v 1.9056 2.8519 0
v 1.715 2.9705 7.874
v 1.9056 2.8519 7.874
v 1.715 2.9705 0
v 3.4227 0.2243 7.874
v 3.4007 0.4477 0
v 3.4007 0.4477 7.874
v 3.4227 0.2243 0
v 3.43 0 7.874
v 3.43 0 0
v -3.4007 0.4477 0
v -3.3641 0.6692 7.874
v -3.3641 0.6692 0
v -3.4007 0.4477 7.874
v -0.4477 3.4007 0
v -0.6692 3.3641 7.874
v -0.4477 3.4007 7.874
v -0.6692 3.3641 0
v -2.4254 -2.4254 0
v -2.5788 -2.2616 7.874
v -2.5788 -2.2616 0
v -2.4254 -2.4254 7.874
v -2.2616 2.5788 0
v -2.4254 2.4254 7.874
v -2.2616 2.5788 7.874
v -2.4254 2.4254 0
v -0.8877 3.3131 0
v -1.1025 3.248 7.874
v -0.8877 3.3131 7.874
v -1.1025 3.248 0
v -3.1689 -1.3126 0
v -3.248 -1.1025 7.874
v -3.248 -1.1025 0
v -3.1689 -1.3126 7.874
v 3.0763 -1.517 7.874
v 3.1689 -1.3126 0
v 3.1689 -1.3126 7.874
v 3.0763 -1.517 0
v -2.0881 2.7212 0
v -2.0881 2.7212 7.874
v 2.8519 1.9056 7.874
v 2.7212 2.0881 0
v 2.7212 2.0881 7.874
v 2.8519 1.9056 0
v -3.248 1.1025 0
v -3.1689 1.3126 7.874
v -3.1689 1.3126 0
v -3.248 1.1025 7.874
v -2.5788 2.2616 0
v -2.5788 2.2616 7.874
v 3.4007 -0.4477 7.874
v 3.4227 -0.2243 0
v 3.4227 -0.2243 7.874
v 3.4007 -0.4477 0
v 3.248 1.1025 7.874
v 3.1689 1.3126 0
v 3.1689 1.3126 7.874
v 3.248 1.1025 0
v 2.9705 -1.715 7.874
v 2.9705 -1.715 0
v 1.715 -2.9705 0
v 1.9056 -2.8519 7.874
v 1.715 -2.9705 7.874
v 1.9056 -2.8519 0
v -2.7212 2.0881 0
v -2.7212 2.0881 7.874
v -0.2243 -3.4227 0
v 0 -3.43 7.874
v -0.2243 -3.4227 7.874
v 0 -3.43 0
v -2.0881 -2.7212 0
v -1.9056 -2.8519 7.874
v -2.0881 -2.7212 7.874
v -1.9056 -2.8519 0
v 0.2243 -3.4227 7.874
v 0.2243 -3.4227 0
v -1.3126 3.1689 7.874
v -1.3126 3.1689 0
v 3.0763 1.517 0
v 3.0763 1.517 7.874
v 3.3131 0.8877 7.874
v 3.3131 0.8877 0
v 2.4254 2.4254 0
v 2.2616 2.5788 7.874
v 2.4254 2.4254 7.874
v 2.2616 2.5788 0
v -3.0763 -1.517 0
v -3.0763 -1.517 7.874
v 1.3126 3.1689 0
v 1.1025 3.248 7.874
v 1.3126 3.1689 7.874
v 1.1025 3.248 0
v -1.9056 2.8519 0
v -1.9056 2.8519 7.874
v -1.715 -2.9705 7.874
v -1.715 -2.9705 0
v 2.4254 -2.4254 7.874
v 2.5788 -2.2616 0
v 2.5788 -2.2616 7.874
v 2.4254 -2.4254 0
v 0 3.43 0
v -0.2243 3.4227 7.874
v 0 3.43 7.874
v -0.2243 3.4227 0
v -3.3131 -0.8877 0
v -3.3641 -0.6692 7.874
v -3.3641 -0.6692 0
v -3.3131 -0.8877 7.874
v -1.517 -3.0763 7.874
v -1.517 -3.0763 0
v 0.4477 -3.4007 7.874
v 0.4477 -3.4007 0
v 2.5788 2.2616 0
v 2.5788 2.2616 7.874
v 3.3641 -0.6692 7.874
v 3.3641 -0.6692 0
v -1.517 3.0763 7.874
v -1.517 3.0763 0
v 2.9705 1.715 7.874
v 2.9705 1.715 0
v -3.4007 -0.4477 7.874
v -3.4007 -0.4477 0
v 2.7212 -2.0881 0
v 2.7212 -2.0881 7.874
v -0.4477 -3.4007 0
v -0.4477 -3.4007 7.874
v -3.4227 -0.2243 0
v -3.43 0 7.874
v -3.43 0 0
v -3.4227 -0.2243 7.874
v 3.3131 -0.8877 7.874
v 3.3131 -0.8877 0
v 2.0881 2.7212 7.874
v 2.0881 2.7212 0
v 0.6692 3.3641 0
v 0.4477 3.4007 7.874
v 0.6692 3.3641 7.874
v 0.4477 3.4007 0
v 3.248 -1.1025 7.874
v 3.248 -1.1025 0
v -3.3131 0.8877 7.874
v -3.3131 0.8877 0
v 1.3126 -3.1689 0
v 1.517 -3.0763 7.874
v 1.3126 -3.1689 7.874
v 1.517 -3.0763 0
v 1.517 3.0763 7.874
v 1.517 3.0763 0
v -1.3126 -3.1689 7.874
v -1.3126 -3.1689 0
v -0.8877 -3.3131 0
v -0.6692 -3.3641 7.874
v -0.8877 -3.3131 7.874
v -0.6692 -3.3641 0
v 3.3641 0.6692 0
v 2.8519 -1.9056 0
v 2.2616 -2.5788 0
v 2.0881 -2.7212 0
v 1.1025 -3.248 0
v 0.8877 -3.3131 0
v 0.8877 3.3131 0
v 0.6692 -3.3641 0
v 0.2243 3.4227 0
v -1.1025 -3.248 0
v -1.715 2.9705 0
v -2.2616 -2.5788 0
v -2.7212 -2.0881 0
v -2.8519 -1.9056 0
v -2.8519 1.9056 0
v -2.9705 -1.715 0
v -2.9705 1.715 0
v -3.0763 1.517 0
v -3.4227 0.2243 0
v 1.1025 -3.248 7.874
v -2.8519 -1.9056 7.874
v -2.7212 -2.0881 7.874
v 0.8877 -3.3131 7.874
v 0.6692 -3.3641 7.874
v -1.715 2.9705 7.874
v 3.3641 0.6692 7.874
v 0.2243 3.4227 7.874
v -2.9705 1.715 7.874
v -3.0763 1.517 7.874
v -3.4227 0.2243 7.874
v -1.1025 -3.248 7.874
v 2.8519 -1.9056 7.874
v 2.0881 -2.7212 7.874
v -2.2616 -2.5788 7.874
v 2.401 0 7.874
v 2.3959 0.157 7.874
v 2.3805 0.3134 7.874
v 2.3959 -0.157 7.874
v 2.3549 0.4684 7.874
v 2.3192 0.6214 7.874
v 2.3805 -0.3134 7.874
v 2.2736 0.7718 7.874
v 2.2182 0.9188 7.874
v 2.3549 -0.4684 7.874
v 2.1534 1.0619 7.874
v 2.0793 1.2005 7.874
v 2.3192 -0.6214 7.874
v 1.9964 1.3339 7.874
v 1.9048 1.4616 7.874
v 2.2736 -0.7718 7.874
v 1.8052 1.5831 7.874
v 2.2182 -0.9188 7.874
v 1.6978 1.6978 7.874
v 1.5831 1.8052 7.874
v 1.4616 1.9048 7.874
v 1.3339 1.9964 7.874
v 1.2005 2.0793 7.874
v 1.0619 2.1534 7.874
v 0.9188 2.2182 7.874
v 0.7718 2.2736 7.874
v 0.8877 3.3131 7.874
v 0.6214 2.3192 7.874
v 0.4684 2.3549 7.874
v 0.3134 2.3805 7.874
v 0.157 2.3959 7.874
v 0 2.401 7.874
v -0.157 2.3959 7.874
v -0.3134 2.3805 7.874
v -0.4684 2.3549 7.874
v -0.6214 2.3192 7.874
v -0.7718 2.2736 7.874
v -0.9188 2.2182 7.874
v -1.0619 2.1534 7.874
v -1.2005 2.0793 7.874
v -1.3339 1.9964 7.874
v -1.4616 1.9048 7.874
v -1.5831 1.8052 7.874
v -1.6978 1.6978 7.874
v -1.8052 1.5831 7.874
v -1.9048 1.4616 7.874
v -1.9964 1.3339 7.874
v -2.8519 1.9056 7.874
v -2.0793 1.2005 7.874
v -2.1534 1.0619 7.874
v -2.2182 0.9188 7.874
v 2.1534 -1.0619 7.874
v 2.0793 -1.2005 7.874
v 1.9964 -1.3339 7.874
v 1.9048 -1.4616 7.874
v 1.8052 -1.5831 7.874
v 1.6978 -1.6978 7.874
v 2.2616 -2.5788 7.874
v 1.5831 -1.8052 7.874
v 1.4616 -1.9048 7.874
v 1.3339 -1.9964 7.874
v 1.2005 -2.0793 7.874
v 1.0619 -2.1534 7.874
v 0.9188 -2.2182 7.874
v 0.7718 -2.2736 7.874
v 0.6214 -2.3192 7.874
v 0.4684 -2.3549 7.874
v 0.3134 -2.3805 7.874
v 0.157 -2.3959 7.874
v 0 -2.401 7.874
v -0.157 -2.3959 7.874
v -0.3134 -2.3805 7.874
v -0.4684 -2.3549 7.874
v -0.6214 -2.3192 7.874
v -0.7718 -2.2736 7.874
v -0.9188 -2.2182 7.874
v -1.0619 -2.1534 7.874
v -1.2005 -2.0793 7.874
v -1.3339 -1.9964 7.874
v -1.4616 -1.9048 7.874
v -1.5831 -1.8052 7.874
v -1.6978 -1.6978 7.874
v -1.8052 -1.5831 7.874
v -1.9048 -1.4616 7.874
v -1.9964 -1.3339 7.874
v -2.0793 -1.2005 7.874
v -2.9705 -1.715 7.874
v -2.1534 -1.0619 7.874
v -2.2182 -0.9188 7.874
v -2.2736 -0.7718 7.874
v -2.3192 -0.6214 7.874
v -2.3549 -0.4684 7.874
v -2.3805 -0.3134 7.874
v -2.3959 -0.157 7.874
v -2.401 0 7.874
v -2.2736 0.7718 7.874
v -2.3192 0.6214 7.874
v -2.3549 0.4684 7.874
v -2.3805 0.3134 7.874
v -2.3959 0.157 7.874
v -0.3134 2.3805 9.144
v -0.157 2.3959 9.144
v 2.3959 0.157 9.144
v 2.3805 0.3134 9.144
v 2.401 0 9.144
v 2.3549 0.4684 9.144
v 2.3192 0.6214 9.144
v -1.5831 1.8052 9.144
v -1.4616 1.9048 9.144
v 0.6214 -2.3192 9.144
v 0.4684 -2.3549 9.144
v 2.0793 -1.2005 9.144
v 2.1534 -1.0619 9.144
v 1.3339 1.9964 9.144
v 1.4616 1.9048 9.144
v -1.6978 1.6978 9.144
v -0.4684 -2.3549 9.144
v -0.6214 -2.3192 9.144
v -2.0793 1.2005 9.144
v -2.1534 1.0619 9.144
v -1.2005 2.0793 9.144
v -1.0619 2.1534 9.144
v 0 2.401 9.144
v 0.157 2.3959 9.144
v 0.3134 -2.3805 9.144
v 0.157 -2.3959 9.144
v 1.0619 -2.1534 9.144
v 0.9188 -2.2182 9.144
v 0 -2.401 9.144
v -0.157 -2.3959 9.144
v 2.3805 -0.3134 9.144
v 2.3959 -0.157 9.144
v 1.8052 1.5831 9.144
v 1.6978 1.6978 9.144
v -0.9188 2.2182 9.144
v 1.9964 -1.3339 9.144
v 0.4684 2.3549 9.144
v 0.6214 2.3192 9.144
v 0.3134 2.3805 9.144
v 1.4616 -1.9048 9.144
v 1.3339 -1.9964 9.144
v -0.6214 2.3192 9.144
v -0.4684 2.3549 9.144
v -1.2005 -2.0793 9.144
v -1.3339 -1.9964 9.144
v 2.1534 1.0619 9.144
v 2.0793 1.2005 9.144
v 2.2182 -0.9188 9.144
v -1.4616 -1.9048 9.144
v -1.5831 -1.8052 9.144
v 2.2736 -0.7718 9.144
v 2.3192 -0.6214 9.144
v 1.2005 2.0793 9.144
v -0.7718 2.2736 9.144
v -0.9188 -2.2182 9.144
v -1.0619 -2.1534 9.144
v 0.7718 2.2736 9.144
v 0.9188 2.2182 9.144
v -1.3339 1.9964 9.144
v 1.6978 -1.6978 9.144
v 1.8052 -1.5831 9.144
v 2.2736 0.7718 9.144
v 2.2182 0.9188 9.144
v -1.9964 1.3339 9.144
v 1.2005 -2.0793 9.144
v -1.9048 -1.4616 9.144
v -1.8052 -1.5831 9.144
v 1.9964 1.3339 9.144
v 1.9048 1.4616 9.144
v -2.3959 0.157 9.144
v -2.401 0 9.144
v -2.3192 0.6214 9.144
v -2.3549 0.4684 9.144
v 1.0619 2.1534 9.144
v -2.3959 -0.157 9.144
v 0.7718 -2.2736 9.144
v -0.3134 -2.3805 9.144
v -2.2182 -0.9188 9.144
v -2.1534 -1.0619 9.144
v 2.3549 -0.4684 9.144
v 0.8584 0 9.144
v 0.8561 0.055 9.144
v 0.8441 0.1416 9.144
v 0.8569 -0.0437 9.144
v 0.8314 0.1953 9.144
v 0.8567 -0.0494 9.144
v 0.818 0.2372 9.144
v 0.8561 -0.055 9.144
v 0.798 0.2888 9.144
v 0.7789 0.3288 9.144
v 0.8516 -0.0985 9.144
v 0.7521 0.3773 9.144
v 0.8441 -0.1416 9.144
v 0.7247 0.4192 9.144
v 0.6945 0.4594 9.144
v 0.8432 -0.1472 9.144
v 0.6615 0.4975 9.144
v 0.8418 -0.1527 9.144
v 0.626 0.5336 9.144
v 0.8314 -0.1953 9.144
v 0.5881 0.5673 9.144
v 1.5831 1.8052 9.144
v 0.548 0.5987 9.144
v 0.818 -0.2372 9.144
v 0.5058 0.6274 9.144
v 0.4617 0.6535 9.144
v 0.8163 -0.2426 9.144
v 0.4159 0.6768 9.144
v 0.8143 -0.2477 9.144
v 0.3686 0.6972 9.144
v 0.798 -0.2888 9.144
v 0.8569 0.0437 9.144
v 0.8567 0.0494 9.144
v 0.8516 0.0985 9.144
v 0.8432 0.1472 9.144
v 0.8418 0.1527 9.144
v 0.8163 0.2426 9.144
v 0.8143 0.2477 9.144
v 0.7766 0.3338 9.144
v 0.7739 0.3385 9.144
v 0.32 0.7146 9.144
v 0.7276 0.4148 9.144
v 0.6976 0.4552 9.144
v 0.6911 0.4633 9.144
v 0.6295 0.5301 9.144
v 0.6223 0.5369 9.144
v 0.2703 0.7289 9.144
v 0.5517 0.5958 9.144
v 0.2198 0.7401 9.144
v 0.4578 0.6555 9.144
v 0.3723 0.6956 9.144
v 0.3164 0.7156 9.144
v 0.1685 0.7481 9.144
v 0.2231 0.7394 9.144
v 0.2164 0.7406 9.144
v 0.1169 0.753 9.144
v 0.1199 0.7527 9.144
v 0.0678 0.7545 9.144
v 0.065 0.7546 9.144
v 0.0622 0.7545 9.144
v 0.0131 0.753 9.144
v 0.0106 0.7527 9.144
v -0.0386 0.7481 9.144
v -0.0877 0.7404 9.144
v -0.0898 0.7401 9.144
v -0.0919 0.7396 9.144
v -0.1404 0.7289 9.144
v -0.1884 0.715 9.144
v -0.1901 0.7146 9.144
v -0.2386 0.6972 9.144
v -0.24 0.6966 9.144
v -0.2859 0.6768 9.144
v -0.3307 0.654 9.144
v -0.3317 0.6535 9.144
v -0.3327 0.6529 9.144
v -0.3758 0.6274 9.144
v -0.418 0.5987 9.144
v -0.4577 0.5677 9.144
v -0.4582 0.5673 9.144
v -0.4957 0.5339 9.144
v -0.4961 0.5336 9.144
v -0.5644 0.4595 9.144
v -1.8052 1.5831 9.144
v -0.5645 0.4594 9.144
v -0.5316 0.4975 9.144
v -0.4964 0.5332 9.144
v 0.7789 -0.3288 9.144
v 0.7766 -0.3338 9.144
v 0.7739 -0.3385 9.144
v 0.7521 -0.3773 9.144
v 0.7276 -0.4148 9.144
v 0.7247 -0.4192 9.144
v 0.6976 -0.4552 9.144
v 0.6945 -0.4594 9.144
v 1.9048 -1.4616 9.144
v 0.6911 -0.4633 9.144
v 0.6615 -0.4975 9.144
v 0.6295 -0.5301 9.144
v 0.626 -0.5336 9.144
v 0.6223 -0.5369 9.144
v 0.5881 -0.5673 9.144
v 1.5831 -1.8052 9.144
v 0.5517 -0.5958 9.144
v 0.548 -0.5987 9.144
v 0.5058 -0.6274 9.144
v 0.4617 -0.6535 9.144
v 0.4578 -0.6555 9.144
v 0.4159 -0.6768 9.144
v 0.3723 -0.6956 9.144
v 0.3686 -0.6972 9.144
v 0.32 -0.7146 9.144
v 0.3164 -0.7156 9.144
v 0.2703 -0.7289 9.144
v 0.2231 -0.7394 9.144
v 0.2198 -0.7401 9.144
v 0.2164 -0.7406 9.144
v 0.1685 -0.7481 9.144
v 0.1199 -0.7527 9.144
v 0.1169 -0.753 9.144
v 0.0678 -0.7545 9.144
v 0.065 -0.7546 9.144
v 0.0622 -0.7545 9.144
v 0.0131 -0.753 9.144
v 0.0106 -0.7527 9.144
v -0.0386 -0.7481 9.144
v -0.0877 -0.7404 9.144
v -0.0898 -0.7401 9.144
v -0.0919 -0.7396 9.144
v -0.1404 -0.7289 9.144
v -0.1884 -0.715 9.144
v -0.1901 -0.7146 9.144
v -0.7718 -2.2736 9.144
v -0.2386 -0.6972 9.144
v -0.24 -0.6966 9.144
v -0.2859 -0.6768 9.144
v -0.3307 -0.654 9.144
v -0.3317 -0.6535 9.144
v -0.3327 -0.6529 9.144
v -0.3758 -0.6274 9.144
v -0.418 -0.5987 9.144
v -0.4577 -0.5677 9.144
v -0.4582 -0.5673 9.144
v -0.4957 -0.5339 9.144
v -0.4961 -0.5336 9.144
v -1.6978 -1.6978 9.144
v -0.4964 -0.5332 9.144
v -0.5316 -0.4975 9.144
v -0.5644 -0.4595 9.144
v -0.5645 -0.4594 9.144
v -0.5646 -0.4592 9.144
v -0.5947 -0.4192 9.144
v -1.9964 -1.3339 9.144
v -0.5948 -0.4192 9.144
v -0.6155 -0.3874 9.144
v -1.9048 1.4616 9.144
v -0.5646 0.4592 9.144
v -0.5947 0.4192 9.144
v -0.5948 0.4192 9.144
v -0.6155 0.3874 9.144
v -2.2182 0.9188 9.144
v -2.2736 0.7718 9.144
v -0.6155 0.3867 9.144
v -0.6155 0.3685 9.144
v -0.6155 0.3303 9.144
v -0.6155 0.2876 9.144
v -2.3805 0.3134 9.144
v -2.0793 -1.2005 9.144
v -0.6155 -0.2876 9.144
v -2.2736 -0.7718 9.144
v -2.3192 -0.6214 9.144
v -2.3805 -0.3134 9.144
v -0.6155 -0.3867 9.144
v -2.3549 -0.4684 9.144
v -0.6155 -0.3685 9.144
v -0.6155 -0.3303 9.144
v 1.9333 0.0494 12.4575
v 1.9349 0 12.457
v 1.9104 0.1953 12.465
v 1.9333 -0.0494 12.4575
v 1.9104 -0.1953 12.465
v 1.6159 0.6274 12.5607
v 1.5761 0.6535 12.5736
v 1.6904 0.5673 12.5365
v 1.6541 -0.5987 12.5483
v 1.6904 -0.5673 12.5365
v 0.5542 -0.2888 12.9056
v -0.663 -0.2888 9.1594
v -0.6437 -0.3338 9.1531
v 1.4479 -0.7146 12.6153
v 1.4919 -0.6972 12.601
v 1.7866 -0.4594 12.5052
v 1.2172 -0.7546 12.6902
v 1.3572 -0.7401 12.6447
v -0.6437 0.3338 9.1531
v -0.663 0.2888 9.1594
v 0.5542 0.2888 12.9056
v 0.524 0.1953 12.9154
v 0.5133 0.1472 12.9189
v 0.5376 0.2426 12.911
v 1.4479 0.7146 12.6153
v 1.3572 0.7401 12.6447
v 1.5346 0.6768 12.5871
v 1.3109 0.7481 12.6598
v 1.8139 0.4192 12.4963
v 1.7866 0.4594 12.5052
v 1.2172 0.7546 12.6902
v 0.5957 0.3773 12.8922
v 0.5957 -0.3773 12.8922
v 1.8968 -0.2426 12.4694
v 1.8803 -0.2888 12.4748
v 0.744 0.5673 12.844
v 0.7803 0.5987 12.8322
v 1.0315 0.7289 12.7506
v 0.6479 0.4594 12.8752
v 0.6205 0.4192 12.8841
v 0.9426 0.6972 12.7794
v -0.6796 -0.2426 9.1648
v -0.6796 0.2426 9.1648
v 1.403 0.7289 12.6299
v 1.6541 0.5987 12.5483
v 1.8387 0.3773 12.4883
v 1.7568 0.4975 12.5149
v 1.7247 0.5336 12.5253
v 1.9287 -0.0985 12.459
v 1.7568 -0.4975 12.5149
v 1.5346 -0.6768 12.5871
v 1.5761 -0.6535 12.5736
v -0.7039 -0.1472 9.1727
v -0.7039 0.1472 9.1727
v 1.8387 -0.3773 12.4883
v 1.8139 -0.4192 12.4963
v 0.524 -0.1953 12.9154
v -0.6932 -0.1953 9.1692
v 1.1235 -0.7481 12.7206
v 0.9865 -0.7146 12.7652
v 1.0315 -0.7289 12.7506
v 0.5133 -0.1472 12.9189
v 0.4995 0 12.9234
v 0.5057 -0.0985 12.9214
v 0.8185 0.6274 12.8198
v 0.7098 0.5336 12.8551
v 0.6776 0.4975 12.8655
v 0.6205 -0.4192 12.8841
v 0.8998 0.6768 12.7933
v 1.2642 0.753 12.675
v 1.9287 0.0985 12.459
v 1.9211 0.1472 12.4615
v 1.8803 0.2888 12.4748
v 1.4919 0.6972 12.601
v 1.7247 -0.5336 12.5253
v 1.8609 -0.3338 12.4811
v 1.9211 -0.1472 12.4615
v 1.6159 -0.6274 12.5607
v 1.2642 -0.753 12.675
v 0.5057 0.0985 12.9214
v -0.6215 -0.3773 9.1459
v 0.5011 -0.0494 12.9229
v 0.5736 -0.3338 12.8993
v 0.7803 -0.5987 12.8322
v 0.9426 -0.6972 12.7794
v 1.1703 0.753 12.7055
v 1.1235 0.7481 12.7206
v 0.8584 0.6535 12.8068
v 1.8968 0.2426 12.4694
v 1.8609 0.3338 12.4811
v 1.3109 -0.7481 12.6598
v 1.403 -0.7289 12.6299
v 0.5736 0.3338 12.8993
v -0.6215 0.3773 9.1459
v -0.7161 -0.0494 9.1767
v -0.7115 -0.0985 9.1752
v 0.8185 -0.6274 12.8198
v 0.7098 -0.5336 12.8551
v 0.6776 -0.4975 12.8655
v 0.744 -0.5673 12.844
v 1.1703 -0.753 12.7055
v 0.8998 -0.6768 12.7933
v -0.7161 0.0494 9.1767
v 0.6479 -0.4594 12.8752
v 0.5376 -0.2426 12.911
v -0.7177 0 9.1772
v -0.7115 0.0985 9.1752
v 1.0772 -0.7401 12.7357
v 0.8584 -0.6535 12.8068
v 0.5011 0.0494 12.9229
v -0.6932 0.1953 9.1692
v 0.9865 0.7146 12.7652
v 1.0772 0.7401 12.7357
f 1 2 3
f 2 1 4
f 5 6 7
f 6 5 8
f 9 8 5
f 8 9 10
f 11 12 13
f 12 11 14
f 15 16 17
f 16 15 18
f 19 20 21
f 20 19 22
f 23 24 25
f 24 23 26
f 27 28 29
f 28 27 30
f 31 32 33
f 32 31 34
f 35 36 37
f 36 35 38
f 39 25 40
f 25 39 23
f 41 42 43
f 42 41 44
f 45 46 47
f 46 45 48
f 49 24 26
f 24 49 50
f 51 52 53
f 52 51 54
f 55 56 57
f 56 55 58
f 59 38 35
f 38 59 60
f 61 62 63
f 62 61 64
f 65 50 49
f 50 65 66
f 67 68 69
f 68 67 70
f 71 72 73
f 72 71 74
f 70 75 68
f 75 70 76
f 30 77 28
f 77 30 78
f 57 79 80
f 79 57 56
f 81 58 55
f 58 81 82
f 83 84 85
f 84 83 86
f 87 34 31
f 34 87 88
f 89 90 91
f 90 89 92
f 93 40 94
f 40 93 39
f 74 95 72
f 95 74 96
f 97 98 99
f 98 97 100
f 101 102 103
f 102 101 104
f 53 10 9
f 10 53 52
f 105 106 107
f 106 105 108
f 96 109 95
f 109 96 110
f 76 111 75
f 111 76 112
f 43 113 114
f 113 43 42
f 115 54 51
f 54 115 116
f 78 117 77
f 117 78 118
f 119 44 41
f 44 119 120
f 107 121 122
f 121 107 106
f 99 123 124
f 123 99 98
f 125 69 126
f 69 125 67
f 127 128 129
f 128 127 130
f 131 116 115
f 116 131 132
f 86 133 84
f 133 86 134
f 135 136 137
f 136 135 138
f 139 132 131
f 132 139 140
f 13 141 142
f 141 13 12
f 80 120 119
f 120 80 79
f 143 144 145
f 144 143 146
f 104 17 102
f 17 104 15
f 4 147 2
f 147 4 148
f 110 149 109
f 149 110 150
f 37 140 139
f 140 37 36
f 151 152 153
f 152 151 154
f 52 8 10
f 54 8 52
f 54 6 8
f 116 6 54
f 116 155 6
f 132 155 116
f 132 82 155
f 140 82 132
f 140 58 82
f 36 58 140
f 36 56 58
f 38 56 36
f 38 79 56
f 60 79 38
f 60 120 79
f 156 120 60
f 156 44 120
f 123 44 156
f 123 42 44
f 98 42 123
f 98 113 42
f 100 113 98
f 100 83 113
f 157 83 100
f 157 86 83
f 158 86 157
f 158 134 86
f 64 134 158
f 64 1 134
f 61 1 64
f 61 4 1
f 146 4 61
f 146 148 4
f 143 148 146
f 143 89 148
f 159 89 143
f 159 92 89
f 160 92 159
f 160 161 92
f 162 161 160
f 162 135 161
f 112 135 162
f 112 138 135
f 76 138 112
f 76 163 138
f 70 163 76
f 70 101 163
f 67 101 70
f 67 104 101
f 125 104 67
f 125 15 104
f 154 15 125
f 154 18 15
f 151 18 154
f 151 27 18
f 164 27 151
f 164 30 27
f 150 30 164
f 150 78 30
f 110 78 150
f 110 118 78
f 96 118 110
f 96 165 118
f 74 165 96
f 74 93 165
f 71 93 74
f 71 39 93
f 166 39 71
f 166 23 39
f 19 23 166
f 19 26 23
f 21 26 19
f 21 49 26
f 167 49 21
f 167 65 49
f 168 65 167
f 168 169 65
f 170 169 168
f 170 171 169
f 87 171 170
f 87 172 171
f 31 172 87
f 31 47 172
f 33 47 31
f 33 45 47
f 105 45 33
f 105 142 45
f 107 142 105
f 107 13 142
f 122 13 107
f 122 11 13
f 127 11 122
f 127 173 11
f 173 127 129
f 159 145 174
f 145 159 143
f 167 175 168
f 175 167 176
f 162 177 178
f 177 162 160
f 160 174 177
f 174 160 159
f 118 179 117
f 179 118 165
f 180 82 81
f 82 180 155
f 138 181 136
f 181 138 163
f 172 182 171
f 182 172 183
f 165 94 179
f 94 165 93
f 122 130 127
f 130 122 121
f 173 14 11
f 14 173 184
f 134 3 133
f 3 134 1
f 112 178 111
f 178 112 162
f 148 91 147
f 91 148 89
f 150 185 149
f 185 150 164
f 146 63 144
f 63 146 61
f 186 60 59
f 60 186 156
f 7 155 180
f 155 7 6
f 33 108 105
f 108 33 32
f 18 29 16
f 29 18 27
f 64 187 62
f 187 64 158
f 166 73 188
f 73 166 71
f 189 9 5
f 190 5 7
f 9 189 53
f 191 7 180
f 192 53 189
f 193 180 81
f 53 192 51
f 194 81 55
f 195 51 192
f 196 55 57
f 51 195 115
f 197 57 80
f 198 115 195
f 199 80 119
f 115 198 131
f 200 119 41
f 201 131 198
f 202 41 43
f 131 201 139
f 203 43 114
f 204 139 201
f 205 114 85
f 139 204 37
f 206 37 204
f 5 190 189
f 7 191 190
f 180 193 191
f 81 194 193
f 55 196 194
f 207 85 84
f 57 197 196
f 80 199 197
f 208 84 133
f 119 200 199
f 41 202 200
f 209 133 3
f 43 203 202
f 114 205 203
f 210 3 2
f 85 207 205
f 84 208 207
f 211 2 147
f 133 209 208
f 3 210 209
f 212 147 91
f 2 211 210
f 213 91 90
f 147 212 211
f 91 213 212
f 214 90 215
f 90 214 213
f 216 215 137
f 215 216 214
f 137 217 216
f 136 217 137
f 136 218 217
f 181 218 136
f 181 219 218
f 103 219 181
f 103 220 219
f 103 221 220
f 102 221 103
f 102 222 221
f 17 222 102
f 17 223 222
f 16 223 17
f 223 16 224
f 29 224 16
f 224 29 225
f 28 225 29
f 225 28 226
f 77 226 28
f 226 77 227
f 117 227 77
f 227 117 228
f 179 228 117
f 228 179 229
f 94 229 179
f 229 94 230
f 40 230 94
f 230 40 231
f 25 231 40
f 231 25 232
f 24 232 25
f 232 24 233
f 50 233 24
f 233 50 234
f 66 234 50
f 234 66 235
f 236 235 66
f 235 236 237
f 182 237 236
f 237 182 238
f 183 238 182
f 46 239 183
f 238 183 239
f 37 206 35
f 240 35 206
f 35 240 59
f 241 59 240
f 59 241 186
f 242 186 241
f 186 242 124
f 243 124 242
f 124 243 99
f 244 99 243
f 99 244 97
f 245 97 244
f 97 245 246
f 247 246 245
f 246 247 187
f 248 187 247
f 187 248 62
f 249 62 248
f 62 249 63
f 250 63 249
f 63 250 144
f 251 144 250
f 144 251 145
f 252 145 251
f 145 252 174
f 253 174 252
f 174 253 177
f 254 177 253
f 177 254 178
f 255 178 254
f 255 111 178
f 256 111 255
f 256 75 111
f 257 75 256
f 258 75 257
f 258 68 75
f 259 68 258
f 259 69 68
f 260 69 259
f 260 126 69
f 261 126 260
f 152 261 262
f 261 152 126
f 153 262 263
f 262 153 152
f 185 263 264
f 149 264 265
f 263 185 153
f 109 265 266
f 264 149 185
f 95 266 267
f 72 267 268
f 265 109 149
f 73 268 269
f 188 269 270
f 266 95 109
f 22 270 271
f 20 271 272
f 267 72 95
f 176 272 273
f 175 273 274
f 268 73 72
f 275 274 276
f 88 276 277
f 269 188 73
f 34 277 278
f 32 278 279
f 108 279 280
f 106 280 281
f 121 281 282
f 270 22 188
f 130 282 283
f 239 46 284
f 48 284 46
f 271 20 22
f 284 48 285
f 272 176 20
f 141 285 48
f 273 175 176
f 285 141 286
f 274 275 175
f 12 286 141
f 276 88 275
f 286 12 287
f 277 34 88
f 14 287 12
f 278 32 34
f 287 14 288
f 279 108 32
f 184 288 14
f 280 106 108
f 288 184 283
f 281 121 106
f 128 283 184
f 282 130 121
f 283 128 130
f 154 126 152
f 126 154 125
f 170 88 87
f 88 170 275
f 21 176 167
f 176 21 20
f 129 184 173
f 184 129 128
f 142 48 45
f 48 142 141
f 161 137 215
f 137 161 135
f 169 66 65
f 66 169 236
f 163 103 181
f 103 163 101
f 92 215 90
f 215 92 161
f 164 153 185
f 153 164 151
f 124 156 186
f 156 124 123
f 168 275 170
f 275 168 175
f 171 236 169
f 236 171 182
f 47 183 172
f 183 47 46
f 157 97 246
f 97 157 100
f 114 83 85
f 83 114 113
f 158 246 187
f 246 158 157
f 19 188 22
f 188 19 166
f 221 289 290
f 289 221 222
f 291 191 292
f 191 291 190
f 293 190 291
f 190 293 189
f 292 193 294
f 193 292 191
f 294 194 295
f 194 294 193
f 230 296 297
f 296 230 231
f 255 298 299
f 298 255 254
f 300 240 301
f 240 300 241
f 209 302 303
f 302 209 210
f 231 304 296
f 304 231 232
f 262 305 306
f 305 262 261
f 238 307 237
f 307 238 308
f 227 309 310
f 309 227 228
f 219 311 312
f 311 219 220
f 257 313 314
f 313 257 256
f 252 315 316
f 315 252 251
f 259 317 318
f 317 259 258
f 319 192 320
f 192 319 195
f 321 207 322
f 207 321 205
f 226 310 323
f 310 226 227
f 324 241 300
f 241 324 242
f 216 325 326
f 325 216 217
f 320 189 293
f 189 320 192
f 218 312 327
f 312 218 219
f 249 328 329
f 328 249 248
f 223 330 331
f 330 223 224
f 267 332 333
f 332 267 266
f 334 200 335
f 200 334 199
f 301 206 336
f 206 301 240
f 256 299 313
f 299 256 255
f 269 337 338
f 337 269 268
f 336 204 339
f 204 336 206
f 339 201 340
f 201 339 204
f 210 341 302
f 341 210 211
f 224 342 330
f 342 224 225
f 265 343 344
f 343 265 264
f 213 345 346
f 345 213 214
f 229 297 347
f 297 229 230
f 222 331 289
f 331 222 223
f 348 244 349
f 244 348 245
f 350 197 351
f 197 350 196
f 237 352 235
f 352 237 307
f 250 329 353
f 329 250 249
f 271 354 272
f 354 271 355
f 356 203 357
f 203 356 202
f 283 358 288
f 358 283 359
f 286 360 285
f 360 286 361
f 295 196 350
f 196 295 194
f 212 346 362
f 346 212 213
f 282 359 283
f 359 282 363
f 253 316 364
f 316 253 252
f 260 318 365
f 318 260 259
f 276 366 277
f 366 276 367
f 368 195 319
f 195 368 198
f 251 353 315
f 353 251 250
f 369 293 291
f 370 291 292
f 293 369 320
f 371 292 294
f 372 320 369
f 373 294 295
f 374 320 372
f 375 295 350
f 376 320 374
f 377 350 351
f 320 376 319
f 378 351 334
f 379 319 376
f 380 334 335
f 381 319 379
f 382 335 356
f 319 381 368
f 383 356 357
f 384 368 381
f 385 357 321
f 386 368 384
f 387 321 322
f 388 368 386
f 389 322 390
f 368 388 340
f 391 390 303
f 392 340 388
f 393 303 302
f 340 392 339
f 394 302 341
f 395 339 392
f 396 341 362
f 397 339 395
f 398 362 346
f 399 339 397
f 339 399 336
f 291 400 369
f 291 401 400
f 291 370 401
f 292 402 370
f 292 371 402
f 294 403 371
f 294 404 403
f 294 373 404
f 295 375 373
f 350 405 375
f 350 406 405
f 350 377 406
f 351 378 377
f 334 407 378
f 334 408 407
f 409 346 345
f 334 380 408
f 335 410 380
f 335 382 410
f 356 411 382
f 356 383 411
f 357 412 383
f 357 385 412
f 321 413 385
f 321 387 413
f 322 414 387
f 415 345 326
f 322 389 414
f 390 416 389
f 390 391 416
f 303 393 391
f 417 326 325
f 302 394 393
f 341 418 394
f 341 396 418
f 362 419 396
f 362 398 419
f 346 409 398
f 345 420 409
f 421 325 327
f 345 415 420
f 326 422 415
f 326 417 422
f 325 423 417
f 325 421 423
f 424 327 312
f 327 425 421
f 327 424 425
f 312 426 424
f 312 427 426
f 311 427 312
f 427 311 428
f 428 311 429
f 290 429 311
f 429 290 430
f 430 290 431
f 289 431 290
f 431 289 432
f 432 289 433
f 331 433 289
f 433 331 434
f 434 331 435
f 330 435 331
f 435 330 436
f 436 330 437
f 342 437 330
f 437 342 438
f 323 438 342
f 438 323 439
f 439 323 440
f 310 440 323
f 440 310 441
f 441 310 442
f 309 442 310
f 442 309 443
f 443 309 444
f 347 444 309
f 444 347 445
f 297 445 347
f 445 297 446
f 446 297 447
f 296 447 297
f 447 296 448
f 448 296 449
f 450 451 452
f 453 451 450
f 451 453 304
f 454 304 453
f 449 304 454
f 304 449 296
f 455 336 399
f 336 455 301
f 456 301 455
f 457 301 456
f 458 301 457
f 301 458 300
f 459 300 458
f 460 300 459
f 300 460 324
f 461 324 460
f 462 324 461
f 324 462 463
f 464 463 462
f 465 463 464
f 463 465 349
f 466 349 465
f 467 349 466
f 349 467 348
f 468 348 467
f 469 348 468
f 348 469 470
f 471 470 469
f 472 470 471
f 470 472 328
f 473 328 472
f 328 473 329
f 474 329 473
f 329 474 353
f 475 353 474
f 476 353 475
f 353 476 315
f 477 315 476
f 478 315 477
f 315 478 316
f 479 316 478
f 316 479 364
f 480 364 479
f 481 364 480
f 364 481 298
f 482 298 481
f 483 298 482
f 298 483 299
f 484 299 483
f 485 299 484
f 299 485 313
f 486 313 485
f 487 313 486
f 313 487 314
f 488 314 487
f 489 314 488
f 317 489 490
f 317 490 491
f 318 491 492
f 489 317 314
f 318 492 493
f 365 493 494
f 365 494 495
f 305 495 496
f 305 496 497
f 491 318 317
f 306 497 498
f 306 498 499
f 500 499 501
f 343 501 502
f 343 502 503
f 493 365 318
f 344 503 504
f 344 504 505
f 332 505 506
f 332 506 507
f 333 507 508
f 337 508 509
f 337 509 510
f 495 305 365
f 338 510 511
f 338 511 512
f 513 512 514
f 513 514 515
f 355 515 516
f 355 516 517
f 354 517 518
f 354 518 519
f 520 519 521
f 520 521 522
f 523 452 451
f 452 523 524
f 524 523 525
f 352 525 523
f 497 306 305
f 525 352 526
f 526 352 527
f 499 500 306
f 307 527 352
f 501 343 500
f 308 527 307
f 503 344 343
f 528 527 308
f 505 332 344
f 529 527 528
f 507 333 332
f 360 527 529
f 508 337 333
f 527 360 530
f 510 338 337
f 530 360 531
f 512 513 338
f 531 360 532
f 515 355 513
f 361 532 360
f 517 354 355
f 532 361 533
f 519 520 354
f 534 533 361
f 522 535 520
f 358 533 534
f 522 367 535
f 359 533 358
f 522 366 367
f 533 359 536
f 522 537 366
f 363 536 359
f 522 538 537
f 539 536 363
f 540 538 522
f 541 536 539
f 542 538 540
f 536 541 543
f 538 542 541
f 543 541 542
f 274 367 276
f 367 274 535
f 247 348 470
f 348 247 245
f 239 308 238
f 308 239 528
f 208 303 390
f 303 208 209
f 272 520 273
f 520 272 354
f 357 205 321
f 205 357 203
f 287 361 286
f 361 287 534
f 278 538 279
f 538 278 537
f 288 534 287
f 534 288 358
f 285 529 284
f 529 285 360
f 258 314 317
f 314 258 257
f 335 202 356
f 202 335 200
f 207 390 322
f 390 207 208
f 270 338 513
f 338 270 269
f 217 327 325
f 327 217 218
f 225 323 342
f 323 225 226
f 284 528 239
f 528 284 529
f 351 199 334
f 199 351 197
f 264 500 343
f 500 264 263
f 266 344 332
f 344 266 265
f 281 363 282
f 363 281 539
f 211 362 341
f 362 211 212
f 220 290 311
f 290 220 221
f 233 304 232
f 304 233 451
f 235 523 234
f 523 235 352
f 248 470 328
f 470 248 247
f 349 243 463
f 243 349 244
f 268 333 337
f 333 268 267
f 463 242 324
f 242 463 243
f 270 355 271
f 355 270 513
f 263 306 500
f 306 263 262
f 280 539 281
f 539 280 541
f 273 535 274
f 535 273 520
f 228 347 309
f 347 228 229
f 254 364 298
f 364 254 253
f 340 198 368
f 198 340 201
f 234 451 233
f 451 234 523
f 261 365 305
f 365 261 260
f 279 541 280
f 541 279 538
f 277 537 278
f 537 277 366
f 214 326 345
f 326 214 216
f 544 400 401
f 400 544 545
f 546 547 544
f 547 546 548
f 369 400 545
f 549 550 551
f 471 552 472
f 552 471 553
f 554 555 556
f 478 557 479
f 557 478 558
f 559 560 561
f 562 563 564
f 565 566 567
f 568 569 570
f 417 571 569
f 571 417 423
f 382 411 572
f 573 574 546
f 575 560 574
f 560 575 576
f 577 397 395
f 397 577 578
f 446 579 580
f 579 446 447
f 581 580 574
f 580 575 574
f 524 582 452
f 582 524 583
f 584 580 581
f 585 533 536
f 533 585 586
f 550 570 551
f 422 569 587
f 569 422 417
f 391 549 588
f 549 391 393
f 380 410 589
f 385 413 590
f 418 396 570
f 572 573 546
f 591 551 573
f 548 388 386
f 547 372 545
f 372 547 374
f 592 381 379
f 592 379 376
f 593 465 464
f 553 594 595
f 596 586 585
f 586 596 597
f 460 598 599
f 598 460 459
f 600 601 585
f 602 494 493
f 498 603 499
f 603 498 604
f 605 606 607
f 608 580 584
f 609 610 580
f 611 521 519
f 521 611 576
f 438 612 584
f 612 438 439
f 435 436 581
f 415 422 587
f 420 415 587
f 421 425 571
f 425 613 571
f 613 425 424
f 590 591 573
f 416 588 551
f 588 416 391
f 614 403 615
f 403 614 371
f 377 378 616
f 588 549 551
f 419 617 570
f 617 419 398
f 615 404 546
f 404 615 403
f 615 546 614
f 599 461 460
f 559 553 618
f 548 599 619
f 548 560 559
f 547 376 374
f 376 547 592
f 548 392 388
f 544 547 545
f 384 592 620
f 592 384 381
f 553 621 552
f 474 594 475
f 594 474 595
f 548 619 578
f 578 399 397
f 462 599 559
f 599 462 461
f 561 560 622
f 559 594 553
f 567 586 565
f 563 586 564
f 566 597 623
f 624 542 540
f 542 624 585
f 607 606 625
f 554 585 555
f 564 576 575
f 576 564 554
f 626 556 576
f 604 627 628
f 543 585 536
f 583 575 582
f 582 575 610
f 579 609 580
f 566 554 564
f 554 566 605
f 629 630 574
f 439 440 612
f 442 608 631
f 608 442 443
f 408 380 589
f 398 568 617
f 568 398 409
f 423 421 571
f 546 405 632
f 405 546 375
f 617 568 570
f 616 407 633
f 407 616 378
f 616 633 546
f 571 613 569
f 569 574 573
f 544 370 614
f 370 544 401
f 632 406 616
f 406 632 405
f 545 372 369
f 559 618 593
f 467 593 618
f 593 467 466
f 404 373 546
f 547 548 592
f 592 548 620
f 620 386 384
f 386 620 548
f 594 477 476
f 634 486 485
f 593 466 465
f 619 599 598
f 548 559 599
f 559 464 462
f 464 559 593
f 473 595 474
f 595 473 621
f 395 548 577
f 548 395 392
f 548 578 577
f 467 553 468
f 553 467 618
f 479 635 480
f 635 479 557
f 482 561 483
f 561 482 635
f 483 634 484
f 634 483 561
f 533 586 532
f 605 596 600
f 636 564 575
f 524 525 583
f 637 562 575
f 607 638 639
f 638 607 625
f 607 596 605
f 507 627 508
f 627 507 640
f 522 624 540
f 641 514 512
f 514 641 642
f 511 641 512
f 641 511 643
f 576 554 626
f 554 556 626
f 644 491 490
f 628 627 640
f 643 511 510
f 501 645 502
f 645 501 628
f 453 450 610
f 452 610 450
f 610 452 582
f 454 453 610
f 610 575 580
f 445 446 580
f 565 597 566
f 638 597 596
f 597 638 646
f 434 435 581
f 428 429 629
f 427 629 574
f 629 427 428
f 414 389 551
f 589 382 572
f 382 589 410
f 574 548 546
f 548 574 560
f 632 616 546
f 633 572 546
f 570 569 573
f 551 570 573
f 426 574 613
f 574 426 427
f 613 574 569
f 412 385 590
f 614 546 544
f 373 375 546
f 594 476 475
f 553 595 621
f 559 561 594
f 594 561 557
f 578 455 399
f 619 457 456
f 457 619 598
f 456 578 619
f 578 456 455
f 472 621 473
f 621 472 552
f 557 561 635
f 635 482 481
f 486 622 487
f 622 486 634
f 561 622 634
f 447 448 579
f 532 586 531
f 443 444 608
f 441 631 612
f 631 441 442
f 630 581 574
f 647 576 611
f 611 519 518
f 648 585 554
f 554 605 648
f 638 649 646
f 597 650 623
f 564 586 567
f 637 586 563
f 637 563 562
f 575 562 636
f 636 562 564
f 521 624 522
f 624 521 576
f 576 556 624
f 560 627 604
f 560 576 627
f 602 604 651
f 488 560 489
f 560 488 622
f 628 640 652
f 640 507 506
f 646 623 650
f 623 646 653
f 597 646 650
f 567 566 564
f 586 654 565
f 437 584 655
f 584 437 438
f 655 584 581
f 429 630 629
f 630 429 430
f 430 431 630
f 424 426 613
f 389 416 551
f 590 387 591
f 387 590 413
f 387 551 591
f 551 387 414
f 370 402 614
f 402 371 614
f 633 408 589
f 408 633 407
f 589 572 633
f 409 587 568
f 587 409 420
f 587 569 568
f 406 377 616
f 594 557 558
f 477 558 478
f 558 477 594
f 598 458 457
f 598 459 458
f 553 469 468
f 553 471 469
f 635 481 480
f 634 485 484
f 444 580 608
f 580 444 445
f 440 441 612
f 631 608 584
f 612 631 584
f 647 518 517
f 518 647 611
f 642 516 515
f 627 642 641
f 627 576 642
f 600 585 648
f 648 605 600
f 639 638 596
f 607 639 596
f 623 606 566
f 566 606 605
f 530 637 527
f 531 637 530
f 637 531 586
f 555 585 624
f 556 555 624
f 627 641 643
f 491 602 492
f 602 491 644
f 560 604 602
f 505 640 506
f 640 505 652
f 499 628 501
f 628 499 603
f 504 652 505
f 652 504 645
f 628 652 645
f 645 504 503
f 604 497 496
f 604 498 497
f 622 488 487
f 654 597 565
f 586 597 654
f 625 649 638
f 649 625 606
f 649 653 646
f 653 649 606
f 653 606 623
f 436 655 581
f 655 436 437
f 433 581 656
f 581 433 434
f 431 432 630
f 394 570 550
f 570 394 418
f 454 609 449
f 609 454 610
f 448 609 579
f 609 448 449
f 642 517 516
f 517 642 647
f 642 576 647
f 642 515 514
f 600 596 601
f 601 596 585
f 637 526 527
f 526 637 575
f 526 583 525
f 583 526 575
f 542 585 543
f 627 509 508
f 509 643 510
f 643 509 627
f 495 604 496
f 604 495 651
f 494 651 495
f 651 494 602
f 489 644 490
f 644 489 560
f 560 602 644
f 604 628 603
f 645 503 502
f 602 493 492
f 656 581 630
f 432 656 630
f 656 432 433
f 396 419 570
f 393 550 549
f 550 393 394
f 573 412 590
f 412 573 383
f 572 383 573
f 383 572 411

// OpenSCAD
$fn = 96;

// Requested dimensions (overall envelope)
switch_body_diameter = 6.86;
switch_body_height   = 12.7;

// Small overlap to guarantee a single connected solid
overlap = 0.2;

module toggle_switch() {
    body_d = switch_body_diameter;
    body_r = body_d/2;
    total_h = switch_body_height;

    // Proportions for a recognizable toggle silhouette while keeping overall size exact
    base_h   = total_h * 0.62;                 // main cylindrical body
    collar_h = total_h * 0.10;                 // small collar/shoulder
    lever_h  = total_h - base_h - collar_h;    // remaining height for lever

    collar_d = body_d * 0.70;
    lever_d  = body_d * 0.22;

    // Lever tilt and length compensation so Z-height stays lever_h
    lever_tilt = 18; // degrees
    lever_len  = lever_h / cos(lever_tilt); // ensures vertical projection equals lever_h

    union() {
        // Main body (exact diameter)
        cylinder(d=body_d, h=base_h, center=false);

        // Collar on top of body (connected with overlap)
        translate([0, 0, base_h - overlap])
            cylinder(d=collar_d, h=collar_h + overlap, center=false);

        // Lever: tilted cylinder starting at top of collar (connected with overlap)
        translate([0, 0, base_h + collar_h - overlap])
            rotate([0, lever_tilt, 0])
                cylinder(d=lever_d, h=lever_len + overlap, center=false);

        // Small rounded tip on lever end (kept within overall height by construction)
        translate([0, 0, base_h + collar_h - overlap])
            rotate([0, lever_tilt, 0])
                translate([0, 0, lever_len - lever_d/2])
                    sphere(d=lever_d);
    }
}

toggle_switch();
